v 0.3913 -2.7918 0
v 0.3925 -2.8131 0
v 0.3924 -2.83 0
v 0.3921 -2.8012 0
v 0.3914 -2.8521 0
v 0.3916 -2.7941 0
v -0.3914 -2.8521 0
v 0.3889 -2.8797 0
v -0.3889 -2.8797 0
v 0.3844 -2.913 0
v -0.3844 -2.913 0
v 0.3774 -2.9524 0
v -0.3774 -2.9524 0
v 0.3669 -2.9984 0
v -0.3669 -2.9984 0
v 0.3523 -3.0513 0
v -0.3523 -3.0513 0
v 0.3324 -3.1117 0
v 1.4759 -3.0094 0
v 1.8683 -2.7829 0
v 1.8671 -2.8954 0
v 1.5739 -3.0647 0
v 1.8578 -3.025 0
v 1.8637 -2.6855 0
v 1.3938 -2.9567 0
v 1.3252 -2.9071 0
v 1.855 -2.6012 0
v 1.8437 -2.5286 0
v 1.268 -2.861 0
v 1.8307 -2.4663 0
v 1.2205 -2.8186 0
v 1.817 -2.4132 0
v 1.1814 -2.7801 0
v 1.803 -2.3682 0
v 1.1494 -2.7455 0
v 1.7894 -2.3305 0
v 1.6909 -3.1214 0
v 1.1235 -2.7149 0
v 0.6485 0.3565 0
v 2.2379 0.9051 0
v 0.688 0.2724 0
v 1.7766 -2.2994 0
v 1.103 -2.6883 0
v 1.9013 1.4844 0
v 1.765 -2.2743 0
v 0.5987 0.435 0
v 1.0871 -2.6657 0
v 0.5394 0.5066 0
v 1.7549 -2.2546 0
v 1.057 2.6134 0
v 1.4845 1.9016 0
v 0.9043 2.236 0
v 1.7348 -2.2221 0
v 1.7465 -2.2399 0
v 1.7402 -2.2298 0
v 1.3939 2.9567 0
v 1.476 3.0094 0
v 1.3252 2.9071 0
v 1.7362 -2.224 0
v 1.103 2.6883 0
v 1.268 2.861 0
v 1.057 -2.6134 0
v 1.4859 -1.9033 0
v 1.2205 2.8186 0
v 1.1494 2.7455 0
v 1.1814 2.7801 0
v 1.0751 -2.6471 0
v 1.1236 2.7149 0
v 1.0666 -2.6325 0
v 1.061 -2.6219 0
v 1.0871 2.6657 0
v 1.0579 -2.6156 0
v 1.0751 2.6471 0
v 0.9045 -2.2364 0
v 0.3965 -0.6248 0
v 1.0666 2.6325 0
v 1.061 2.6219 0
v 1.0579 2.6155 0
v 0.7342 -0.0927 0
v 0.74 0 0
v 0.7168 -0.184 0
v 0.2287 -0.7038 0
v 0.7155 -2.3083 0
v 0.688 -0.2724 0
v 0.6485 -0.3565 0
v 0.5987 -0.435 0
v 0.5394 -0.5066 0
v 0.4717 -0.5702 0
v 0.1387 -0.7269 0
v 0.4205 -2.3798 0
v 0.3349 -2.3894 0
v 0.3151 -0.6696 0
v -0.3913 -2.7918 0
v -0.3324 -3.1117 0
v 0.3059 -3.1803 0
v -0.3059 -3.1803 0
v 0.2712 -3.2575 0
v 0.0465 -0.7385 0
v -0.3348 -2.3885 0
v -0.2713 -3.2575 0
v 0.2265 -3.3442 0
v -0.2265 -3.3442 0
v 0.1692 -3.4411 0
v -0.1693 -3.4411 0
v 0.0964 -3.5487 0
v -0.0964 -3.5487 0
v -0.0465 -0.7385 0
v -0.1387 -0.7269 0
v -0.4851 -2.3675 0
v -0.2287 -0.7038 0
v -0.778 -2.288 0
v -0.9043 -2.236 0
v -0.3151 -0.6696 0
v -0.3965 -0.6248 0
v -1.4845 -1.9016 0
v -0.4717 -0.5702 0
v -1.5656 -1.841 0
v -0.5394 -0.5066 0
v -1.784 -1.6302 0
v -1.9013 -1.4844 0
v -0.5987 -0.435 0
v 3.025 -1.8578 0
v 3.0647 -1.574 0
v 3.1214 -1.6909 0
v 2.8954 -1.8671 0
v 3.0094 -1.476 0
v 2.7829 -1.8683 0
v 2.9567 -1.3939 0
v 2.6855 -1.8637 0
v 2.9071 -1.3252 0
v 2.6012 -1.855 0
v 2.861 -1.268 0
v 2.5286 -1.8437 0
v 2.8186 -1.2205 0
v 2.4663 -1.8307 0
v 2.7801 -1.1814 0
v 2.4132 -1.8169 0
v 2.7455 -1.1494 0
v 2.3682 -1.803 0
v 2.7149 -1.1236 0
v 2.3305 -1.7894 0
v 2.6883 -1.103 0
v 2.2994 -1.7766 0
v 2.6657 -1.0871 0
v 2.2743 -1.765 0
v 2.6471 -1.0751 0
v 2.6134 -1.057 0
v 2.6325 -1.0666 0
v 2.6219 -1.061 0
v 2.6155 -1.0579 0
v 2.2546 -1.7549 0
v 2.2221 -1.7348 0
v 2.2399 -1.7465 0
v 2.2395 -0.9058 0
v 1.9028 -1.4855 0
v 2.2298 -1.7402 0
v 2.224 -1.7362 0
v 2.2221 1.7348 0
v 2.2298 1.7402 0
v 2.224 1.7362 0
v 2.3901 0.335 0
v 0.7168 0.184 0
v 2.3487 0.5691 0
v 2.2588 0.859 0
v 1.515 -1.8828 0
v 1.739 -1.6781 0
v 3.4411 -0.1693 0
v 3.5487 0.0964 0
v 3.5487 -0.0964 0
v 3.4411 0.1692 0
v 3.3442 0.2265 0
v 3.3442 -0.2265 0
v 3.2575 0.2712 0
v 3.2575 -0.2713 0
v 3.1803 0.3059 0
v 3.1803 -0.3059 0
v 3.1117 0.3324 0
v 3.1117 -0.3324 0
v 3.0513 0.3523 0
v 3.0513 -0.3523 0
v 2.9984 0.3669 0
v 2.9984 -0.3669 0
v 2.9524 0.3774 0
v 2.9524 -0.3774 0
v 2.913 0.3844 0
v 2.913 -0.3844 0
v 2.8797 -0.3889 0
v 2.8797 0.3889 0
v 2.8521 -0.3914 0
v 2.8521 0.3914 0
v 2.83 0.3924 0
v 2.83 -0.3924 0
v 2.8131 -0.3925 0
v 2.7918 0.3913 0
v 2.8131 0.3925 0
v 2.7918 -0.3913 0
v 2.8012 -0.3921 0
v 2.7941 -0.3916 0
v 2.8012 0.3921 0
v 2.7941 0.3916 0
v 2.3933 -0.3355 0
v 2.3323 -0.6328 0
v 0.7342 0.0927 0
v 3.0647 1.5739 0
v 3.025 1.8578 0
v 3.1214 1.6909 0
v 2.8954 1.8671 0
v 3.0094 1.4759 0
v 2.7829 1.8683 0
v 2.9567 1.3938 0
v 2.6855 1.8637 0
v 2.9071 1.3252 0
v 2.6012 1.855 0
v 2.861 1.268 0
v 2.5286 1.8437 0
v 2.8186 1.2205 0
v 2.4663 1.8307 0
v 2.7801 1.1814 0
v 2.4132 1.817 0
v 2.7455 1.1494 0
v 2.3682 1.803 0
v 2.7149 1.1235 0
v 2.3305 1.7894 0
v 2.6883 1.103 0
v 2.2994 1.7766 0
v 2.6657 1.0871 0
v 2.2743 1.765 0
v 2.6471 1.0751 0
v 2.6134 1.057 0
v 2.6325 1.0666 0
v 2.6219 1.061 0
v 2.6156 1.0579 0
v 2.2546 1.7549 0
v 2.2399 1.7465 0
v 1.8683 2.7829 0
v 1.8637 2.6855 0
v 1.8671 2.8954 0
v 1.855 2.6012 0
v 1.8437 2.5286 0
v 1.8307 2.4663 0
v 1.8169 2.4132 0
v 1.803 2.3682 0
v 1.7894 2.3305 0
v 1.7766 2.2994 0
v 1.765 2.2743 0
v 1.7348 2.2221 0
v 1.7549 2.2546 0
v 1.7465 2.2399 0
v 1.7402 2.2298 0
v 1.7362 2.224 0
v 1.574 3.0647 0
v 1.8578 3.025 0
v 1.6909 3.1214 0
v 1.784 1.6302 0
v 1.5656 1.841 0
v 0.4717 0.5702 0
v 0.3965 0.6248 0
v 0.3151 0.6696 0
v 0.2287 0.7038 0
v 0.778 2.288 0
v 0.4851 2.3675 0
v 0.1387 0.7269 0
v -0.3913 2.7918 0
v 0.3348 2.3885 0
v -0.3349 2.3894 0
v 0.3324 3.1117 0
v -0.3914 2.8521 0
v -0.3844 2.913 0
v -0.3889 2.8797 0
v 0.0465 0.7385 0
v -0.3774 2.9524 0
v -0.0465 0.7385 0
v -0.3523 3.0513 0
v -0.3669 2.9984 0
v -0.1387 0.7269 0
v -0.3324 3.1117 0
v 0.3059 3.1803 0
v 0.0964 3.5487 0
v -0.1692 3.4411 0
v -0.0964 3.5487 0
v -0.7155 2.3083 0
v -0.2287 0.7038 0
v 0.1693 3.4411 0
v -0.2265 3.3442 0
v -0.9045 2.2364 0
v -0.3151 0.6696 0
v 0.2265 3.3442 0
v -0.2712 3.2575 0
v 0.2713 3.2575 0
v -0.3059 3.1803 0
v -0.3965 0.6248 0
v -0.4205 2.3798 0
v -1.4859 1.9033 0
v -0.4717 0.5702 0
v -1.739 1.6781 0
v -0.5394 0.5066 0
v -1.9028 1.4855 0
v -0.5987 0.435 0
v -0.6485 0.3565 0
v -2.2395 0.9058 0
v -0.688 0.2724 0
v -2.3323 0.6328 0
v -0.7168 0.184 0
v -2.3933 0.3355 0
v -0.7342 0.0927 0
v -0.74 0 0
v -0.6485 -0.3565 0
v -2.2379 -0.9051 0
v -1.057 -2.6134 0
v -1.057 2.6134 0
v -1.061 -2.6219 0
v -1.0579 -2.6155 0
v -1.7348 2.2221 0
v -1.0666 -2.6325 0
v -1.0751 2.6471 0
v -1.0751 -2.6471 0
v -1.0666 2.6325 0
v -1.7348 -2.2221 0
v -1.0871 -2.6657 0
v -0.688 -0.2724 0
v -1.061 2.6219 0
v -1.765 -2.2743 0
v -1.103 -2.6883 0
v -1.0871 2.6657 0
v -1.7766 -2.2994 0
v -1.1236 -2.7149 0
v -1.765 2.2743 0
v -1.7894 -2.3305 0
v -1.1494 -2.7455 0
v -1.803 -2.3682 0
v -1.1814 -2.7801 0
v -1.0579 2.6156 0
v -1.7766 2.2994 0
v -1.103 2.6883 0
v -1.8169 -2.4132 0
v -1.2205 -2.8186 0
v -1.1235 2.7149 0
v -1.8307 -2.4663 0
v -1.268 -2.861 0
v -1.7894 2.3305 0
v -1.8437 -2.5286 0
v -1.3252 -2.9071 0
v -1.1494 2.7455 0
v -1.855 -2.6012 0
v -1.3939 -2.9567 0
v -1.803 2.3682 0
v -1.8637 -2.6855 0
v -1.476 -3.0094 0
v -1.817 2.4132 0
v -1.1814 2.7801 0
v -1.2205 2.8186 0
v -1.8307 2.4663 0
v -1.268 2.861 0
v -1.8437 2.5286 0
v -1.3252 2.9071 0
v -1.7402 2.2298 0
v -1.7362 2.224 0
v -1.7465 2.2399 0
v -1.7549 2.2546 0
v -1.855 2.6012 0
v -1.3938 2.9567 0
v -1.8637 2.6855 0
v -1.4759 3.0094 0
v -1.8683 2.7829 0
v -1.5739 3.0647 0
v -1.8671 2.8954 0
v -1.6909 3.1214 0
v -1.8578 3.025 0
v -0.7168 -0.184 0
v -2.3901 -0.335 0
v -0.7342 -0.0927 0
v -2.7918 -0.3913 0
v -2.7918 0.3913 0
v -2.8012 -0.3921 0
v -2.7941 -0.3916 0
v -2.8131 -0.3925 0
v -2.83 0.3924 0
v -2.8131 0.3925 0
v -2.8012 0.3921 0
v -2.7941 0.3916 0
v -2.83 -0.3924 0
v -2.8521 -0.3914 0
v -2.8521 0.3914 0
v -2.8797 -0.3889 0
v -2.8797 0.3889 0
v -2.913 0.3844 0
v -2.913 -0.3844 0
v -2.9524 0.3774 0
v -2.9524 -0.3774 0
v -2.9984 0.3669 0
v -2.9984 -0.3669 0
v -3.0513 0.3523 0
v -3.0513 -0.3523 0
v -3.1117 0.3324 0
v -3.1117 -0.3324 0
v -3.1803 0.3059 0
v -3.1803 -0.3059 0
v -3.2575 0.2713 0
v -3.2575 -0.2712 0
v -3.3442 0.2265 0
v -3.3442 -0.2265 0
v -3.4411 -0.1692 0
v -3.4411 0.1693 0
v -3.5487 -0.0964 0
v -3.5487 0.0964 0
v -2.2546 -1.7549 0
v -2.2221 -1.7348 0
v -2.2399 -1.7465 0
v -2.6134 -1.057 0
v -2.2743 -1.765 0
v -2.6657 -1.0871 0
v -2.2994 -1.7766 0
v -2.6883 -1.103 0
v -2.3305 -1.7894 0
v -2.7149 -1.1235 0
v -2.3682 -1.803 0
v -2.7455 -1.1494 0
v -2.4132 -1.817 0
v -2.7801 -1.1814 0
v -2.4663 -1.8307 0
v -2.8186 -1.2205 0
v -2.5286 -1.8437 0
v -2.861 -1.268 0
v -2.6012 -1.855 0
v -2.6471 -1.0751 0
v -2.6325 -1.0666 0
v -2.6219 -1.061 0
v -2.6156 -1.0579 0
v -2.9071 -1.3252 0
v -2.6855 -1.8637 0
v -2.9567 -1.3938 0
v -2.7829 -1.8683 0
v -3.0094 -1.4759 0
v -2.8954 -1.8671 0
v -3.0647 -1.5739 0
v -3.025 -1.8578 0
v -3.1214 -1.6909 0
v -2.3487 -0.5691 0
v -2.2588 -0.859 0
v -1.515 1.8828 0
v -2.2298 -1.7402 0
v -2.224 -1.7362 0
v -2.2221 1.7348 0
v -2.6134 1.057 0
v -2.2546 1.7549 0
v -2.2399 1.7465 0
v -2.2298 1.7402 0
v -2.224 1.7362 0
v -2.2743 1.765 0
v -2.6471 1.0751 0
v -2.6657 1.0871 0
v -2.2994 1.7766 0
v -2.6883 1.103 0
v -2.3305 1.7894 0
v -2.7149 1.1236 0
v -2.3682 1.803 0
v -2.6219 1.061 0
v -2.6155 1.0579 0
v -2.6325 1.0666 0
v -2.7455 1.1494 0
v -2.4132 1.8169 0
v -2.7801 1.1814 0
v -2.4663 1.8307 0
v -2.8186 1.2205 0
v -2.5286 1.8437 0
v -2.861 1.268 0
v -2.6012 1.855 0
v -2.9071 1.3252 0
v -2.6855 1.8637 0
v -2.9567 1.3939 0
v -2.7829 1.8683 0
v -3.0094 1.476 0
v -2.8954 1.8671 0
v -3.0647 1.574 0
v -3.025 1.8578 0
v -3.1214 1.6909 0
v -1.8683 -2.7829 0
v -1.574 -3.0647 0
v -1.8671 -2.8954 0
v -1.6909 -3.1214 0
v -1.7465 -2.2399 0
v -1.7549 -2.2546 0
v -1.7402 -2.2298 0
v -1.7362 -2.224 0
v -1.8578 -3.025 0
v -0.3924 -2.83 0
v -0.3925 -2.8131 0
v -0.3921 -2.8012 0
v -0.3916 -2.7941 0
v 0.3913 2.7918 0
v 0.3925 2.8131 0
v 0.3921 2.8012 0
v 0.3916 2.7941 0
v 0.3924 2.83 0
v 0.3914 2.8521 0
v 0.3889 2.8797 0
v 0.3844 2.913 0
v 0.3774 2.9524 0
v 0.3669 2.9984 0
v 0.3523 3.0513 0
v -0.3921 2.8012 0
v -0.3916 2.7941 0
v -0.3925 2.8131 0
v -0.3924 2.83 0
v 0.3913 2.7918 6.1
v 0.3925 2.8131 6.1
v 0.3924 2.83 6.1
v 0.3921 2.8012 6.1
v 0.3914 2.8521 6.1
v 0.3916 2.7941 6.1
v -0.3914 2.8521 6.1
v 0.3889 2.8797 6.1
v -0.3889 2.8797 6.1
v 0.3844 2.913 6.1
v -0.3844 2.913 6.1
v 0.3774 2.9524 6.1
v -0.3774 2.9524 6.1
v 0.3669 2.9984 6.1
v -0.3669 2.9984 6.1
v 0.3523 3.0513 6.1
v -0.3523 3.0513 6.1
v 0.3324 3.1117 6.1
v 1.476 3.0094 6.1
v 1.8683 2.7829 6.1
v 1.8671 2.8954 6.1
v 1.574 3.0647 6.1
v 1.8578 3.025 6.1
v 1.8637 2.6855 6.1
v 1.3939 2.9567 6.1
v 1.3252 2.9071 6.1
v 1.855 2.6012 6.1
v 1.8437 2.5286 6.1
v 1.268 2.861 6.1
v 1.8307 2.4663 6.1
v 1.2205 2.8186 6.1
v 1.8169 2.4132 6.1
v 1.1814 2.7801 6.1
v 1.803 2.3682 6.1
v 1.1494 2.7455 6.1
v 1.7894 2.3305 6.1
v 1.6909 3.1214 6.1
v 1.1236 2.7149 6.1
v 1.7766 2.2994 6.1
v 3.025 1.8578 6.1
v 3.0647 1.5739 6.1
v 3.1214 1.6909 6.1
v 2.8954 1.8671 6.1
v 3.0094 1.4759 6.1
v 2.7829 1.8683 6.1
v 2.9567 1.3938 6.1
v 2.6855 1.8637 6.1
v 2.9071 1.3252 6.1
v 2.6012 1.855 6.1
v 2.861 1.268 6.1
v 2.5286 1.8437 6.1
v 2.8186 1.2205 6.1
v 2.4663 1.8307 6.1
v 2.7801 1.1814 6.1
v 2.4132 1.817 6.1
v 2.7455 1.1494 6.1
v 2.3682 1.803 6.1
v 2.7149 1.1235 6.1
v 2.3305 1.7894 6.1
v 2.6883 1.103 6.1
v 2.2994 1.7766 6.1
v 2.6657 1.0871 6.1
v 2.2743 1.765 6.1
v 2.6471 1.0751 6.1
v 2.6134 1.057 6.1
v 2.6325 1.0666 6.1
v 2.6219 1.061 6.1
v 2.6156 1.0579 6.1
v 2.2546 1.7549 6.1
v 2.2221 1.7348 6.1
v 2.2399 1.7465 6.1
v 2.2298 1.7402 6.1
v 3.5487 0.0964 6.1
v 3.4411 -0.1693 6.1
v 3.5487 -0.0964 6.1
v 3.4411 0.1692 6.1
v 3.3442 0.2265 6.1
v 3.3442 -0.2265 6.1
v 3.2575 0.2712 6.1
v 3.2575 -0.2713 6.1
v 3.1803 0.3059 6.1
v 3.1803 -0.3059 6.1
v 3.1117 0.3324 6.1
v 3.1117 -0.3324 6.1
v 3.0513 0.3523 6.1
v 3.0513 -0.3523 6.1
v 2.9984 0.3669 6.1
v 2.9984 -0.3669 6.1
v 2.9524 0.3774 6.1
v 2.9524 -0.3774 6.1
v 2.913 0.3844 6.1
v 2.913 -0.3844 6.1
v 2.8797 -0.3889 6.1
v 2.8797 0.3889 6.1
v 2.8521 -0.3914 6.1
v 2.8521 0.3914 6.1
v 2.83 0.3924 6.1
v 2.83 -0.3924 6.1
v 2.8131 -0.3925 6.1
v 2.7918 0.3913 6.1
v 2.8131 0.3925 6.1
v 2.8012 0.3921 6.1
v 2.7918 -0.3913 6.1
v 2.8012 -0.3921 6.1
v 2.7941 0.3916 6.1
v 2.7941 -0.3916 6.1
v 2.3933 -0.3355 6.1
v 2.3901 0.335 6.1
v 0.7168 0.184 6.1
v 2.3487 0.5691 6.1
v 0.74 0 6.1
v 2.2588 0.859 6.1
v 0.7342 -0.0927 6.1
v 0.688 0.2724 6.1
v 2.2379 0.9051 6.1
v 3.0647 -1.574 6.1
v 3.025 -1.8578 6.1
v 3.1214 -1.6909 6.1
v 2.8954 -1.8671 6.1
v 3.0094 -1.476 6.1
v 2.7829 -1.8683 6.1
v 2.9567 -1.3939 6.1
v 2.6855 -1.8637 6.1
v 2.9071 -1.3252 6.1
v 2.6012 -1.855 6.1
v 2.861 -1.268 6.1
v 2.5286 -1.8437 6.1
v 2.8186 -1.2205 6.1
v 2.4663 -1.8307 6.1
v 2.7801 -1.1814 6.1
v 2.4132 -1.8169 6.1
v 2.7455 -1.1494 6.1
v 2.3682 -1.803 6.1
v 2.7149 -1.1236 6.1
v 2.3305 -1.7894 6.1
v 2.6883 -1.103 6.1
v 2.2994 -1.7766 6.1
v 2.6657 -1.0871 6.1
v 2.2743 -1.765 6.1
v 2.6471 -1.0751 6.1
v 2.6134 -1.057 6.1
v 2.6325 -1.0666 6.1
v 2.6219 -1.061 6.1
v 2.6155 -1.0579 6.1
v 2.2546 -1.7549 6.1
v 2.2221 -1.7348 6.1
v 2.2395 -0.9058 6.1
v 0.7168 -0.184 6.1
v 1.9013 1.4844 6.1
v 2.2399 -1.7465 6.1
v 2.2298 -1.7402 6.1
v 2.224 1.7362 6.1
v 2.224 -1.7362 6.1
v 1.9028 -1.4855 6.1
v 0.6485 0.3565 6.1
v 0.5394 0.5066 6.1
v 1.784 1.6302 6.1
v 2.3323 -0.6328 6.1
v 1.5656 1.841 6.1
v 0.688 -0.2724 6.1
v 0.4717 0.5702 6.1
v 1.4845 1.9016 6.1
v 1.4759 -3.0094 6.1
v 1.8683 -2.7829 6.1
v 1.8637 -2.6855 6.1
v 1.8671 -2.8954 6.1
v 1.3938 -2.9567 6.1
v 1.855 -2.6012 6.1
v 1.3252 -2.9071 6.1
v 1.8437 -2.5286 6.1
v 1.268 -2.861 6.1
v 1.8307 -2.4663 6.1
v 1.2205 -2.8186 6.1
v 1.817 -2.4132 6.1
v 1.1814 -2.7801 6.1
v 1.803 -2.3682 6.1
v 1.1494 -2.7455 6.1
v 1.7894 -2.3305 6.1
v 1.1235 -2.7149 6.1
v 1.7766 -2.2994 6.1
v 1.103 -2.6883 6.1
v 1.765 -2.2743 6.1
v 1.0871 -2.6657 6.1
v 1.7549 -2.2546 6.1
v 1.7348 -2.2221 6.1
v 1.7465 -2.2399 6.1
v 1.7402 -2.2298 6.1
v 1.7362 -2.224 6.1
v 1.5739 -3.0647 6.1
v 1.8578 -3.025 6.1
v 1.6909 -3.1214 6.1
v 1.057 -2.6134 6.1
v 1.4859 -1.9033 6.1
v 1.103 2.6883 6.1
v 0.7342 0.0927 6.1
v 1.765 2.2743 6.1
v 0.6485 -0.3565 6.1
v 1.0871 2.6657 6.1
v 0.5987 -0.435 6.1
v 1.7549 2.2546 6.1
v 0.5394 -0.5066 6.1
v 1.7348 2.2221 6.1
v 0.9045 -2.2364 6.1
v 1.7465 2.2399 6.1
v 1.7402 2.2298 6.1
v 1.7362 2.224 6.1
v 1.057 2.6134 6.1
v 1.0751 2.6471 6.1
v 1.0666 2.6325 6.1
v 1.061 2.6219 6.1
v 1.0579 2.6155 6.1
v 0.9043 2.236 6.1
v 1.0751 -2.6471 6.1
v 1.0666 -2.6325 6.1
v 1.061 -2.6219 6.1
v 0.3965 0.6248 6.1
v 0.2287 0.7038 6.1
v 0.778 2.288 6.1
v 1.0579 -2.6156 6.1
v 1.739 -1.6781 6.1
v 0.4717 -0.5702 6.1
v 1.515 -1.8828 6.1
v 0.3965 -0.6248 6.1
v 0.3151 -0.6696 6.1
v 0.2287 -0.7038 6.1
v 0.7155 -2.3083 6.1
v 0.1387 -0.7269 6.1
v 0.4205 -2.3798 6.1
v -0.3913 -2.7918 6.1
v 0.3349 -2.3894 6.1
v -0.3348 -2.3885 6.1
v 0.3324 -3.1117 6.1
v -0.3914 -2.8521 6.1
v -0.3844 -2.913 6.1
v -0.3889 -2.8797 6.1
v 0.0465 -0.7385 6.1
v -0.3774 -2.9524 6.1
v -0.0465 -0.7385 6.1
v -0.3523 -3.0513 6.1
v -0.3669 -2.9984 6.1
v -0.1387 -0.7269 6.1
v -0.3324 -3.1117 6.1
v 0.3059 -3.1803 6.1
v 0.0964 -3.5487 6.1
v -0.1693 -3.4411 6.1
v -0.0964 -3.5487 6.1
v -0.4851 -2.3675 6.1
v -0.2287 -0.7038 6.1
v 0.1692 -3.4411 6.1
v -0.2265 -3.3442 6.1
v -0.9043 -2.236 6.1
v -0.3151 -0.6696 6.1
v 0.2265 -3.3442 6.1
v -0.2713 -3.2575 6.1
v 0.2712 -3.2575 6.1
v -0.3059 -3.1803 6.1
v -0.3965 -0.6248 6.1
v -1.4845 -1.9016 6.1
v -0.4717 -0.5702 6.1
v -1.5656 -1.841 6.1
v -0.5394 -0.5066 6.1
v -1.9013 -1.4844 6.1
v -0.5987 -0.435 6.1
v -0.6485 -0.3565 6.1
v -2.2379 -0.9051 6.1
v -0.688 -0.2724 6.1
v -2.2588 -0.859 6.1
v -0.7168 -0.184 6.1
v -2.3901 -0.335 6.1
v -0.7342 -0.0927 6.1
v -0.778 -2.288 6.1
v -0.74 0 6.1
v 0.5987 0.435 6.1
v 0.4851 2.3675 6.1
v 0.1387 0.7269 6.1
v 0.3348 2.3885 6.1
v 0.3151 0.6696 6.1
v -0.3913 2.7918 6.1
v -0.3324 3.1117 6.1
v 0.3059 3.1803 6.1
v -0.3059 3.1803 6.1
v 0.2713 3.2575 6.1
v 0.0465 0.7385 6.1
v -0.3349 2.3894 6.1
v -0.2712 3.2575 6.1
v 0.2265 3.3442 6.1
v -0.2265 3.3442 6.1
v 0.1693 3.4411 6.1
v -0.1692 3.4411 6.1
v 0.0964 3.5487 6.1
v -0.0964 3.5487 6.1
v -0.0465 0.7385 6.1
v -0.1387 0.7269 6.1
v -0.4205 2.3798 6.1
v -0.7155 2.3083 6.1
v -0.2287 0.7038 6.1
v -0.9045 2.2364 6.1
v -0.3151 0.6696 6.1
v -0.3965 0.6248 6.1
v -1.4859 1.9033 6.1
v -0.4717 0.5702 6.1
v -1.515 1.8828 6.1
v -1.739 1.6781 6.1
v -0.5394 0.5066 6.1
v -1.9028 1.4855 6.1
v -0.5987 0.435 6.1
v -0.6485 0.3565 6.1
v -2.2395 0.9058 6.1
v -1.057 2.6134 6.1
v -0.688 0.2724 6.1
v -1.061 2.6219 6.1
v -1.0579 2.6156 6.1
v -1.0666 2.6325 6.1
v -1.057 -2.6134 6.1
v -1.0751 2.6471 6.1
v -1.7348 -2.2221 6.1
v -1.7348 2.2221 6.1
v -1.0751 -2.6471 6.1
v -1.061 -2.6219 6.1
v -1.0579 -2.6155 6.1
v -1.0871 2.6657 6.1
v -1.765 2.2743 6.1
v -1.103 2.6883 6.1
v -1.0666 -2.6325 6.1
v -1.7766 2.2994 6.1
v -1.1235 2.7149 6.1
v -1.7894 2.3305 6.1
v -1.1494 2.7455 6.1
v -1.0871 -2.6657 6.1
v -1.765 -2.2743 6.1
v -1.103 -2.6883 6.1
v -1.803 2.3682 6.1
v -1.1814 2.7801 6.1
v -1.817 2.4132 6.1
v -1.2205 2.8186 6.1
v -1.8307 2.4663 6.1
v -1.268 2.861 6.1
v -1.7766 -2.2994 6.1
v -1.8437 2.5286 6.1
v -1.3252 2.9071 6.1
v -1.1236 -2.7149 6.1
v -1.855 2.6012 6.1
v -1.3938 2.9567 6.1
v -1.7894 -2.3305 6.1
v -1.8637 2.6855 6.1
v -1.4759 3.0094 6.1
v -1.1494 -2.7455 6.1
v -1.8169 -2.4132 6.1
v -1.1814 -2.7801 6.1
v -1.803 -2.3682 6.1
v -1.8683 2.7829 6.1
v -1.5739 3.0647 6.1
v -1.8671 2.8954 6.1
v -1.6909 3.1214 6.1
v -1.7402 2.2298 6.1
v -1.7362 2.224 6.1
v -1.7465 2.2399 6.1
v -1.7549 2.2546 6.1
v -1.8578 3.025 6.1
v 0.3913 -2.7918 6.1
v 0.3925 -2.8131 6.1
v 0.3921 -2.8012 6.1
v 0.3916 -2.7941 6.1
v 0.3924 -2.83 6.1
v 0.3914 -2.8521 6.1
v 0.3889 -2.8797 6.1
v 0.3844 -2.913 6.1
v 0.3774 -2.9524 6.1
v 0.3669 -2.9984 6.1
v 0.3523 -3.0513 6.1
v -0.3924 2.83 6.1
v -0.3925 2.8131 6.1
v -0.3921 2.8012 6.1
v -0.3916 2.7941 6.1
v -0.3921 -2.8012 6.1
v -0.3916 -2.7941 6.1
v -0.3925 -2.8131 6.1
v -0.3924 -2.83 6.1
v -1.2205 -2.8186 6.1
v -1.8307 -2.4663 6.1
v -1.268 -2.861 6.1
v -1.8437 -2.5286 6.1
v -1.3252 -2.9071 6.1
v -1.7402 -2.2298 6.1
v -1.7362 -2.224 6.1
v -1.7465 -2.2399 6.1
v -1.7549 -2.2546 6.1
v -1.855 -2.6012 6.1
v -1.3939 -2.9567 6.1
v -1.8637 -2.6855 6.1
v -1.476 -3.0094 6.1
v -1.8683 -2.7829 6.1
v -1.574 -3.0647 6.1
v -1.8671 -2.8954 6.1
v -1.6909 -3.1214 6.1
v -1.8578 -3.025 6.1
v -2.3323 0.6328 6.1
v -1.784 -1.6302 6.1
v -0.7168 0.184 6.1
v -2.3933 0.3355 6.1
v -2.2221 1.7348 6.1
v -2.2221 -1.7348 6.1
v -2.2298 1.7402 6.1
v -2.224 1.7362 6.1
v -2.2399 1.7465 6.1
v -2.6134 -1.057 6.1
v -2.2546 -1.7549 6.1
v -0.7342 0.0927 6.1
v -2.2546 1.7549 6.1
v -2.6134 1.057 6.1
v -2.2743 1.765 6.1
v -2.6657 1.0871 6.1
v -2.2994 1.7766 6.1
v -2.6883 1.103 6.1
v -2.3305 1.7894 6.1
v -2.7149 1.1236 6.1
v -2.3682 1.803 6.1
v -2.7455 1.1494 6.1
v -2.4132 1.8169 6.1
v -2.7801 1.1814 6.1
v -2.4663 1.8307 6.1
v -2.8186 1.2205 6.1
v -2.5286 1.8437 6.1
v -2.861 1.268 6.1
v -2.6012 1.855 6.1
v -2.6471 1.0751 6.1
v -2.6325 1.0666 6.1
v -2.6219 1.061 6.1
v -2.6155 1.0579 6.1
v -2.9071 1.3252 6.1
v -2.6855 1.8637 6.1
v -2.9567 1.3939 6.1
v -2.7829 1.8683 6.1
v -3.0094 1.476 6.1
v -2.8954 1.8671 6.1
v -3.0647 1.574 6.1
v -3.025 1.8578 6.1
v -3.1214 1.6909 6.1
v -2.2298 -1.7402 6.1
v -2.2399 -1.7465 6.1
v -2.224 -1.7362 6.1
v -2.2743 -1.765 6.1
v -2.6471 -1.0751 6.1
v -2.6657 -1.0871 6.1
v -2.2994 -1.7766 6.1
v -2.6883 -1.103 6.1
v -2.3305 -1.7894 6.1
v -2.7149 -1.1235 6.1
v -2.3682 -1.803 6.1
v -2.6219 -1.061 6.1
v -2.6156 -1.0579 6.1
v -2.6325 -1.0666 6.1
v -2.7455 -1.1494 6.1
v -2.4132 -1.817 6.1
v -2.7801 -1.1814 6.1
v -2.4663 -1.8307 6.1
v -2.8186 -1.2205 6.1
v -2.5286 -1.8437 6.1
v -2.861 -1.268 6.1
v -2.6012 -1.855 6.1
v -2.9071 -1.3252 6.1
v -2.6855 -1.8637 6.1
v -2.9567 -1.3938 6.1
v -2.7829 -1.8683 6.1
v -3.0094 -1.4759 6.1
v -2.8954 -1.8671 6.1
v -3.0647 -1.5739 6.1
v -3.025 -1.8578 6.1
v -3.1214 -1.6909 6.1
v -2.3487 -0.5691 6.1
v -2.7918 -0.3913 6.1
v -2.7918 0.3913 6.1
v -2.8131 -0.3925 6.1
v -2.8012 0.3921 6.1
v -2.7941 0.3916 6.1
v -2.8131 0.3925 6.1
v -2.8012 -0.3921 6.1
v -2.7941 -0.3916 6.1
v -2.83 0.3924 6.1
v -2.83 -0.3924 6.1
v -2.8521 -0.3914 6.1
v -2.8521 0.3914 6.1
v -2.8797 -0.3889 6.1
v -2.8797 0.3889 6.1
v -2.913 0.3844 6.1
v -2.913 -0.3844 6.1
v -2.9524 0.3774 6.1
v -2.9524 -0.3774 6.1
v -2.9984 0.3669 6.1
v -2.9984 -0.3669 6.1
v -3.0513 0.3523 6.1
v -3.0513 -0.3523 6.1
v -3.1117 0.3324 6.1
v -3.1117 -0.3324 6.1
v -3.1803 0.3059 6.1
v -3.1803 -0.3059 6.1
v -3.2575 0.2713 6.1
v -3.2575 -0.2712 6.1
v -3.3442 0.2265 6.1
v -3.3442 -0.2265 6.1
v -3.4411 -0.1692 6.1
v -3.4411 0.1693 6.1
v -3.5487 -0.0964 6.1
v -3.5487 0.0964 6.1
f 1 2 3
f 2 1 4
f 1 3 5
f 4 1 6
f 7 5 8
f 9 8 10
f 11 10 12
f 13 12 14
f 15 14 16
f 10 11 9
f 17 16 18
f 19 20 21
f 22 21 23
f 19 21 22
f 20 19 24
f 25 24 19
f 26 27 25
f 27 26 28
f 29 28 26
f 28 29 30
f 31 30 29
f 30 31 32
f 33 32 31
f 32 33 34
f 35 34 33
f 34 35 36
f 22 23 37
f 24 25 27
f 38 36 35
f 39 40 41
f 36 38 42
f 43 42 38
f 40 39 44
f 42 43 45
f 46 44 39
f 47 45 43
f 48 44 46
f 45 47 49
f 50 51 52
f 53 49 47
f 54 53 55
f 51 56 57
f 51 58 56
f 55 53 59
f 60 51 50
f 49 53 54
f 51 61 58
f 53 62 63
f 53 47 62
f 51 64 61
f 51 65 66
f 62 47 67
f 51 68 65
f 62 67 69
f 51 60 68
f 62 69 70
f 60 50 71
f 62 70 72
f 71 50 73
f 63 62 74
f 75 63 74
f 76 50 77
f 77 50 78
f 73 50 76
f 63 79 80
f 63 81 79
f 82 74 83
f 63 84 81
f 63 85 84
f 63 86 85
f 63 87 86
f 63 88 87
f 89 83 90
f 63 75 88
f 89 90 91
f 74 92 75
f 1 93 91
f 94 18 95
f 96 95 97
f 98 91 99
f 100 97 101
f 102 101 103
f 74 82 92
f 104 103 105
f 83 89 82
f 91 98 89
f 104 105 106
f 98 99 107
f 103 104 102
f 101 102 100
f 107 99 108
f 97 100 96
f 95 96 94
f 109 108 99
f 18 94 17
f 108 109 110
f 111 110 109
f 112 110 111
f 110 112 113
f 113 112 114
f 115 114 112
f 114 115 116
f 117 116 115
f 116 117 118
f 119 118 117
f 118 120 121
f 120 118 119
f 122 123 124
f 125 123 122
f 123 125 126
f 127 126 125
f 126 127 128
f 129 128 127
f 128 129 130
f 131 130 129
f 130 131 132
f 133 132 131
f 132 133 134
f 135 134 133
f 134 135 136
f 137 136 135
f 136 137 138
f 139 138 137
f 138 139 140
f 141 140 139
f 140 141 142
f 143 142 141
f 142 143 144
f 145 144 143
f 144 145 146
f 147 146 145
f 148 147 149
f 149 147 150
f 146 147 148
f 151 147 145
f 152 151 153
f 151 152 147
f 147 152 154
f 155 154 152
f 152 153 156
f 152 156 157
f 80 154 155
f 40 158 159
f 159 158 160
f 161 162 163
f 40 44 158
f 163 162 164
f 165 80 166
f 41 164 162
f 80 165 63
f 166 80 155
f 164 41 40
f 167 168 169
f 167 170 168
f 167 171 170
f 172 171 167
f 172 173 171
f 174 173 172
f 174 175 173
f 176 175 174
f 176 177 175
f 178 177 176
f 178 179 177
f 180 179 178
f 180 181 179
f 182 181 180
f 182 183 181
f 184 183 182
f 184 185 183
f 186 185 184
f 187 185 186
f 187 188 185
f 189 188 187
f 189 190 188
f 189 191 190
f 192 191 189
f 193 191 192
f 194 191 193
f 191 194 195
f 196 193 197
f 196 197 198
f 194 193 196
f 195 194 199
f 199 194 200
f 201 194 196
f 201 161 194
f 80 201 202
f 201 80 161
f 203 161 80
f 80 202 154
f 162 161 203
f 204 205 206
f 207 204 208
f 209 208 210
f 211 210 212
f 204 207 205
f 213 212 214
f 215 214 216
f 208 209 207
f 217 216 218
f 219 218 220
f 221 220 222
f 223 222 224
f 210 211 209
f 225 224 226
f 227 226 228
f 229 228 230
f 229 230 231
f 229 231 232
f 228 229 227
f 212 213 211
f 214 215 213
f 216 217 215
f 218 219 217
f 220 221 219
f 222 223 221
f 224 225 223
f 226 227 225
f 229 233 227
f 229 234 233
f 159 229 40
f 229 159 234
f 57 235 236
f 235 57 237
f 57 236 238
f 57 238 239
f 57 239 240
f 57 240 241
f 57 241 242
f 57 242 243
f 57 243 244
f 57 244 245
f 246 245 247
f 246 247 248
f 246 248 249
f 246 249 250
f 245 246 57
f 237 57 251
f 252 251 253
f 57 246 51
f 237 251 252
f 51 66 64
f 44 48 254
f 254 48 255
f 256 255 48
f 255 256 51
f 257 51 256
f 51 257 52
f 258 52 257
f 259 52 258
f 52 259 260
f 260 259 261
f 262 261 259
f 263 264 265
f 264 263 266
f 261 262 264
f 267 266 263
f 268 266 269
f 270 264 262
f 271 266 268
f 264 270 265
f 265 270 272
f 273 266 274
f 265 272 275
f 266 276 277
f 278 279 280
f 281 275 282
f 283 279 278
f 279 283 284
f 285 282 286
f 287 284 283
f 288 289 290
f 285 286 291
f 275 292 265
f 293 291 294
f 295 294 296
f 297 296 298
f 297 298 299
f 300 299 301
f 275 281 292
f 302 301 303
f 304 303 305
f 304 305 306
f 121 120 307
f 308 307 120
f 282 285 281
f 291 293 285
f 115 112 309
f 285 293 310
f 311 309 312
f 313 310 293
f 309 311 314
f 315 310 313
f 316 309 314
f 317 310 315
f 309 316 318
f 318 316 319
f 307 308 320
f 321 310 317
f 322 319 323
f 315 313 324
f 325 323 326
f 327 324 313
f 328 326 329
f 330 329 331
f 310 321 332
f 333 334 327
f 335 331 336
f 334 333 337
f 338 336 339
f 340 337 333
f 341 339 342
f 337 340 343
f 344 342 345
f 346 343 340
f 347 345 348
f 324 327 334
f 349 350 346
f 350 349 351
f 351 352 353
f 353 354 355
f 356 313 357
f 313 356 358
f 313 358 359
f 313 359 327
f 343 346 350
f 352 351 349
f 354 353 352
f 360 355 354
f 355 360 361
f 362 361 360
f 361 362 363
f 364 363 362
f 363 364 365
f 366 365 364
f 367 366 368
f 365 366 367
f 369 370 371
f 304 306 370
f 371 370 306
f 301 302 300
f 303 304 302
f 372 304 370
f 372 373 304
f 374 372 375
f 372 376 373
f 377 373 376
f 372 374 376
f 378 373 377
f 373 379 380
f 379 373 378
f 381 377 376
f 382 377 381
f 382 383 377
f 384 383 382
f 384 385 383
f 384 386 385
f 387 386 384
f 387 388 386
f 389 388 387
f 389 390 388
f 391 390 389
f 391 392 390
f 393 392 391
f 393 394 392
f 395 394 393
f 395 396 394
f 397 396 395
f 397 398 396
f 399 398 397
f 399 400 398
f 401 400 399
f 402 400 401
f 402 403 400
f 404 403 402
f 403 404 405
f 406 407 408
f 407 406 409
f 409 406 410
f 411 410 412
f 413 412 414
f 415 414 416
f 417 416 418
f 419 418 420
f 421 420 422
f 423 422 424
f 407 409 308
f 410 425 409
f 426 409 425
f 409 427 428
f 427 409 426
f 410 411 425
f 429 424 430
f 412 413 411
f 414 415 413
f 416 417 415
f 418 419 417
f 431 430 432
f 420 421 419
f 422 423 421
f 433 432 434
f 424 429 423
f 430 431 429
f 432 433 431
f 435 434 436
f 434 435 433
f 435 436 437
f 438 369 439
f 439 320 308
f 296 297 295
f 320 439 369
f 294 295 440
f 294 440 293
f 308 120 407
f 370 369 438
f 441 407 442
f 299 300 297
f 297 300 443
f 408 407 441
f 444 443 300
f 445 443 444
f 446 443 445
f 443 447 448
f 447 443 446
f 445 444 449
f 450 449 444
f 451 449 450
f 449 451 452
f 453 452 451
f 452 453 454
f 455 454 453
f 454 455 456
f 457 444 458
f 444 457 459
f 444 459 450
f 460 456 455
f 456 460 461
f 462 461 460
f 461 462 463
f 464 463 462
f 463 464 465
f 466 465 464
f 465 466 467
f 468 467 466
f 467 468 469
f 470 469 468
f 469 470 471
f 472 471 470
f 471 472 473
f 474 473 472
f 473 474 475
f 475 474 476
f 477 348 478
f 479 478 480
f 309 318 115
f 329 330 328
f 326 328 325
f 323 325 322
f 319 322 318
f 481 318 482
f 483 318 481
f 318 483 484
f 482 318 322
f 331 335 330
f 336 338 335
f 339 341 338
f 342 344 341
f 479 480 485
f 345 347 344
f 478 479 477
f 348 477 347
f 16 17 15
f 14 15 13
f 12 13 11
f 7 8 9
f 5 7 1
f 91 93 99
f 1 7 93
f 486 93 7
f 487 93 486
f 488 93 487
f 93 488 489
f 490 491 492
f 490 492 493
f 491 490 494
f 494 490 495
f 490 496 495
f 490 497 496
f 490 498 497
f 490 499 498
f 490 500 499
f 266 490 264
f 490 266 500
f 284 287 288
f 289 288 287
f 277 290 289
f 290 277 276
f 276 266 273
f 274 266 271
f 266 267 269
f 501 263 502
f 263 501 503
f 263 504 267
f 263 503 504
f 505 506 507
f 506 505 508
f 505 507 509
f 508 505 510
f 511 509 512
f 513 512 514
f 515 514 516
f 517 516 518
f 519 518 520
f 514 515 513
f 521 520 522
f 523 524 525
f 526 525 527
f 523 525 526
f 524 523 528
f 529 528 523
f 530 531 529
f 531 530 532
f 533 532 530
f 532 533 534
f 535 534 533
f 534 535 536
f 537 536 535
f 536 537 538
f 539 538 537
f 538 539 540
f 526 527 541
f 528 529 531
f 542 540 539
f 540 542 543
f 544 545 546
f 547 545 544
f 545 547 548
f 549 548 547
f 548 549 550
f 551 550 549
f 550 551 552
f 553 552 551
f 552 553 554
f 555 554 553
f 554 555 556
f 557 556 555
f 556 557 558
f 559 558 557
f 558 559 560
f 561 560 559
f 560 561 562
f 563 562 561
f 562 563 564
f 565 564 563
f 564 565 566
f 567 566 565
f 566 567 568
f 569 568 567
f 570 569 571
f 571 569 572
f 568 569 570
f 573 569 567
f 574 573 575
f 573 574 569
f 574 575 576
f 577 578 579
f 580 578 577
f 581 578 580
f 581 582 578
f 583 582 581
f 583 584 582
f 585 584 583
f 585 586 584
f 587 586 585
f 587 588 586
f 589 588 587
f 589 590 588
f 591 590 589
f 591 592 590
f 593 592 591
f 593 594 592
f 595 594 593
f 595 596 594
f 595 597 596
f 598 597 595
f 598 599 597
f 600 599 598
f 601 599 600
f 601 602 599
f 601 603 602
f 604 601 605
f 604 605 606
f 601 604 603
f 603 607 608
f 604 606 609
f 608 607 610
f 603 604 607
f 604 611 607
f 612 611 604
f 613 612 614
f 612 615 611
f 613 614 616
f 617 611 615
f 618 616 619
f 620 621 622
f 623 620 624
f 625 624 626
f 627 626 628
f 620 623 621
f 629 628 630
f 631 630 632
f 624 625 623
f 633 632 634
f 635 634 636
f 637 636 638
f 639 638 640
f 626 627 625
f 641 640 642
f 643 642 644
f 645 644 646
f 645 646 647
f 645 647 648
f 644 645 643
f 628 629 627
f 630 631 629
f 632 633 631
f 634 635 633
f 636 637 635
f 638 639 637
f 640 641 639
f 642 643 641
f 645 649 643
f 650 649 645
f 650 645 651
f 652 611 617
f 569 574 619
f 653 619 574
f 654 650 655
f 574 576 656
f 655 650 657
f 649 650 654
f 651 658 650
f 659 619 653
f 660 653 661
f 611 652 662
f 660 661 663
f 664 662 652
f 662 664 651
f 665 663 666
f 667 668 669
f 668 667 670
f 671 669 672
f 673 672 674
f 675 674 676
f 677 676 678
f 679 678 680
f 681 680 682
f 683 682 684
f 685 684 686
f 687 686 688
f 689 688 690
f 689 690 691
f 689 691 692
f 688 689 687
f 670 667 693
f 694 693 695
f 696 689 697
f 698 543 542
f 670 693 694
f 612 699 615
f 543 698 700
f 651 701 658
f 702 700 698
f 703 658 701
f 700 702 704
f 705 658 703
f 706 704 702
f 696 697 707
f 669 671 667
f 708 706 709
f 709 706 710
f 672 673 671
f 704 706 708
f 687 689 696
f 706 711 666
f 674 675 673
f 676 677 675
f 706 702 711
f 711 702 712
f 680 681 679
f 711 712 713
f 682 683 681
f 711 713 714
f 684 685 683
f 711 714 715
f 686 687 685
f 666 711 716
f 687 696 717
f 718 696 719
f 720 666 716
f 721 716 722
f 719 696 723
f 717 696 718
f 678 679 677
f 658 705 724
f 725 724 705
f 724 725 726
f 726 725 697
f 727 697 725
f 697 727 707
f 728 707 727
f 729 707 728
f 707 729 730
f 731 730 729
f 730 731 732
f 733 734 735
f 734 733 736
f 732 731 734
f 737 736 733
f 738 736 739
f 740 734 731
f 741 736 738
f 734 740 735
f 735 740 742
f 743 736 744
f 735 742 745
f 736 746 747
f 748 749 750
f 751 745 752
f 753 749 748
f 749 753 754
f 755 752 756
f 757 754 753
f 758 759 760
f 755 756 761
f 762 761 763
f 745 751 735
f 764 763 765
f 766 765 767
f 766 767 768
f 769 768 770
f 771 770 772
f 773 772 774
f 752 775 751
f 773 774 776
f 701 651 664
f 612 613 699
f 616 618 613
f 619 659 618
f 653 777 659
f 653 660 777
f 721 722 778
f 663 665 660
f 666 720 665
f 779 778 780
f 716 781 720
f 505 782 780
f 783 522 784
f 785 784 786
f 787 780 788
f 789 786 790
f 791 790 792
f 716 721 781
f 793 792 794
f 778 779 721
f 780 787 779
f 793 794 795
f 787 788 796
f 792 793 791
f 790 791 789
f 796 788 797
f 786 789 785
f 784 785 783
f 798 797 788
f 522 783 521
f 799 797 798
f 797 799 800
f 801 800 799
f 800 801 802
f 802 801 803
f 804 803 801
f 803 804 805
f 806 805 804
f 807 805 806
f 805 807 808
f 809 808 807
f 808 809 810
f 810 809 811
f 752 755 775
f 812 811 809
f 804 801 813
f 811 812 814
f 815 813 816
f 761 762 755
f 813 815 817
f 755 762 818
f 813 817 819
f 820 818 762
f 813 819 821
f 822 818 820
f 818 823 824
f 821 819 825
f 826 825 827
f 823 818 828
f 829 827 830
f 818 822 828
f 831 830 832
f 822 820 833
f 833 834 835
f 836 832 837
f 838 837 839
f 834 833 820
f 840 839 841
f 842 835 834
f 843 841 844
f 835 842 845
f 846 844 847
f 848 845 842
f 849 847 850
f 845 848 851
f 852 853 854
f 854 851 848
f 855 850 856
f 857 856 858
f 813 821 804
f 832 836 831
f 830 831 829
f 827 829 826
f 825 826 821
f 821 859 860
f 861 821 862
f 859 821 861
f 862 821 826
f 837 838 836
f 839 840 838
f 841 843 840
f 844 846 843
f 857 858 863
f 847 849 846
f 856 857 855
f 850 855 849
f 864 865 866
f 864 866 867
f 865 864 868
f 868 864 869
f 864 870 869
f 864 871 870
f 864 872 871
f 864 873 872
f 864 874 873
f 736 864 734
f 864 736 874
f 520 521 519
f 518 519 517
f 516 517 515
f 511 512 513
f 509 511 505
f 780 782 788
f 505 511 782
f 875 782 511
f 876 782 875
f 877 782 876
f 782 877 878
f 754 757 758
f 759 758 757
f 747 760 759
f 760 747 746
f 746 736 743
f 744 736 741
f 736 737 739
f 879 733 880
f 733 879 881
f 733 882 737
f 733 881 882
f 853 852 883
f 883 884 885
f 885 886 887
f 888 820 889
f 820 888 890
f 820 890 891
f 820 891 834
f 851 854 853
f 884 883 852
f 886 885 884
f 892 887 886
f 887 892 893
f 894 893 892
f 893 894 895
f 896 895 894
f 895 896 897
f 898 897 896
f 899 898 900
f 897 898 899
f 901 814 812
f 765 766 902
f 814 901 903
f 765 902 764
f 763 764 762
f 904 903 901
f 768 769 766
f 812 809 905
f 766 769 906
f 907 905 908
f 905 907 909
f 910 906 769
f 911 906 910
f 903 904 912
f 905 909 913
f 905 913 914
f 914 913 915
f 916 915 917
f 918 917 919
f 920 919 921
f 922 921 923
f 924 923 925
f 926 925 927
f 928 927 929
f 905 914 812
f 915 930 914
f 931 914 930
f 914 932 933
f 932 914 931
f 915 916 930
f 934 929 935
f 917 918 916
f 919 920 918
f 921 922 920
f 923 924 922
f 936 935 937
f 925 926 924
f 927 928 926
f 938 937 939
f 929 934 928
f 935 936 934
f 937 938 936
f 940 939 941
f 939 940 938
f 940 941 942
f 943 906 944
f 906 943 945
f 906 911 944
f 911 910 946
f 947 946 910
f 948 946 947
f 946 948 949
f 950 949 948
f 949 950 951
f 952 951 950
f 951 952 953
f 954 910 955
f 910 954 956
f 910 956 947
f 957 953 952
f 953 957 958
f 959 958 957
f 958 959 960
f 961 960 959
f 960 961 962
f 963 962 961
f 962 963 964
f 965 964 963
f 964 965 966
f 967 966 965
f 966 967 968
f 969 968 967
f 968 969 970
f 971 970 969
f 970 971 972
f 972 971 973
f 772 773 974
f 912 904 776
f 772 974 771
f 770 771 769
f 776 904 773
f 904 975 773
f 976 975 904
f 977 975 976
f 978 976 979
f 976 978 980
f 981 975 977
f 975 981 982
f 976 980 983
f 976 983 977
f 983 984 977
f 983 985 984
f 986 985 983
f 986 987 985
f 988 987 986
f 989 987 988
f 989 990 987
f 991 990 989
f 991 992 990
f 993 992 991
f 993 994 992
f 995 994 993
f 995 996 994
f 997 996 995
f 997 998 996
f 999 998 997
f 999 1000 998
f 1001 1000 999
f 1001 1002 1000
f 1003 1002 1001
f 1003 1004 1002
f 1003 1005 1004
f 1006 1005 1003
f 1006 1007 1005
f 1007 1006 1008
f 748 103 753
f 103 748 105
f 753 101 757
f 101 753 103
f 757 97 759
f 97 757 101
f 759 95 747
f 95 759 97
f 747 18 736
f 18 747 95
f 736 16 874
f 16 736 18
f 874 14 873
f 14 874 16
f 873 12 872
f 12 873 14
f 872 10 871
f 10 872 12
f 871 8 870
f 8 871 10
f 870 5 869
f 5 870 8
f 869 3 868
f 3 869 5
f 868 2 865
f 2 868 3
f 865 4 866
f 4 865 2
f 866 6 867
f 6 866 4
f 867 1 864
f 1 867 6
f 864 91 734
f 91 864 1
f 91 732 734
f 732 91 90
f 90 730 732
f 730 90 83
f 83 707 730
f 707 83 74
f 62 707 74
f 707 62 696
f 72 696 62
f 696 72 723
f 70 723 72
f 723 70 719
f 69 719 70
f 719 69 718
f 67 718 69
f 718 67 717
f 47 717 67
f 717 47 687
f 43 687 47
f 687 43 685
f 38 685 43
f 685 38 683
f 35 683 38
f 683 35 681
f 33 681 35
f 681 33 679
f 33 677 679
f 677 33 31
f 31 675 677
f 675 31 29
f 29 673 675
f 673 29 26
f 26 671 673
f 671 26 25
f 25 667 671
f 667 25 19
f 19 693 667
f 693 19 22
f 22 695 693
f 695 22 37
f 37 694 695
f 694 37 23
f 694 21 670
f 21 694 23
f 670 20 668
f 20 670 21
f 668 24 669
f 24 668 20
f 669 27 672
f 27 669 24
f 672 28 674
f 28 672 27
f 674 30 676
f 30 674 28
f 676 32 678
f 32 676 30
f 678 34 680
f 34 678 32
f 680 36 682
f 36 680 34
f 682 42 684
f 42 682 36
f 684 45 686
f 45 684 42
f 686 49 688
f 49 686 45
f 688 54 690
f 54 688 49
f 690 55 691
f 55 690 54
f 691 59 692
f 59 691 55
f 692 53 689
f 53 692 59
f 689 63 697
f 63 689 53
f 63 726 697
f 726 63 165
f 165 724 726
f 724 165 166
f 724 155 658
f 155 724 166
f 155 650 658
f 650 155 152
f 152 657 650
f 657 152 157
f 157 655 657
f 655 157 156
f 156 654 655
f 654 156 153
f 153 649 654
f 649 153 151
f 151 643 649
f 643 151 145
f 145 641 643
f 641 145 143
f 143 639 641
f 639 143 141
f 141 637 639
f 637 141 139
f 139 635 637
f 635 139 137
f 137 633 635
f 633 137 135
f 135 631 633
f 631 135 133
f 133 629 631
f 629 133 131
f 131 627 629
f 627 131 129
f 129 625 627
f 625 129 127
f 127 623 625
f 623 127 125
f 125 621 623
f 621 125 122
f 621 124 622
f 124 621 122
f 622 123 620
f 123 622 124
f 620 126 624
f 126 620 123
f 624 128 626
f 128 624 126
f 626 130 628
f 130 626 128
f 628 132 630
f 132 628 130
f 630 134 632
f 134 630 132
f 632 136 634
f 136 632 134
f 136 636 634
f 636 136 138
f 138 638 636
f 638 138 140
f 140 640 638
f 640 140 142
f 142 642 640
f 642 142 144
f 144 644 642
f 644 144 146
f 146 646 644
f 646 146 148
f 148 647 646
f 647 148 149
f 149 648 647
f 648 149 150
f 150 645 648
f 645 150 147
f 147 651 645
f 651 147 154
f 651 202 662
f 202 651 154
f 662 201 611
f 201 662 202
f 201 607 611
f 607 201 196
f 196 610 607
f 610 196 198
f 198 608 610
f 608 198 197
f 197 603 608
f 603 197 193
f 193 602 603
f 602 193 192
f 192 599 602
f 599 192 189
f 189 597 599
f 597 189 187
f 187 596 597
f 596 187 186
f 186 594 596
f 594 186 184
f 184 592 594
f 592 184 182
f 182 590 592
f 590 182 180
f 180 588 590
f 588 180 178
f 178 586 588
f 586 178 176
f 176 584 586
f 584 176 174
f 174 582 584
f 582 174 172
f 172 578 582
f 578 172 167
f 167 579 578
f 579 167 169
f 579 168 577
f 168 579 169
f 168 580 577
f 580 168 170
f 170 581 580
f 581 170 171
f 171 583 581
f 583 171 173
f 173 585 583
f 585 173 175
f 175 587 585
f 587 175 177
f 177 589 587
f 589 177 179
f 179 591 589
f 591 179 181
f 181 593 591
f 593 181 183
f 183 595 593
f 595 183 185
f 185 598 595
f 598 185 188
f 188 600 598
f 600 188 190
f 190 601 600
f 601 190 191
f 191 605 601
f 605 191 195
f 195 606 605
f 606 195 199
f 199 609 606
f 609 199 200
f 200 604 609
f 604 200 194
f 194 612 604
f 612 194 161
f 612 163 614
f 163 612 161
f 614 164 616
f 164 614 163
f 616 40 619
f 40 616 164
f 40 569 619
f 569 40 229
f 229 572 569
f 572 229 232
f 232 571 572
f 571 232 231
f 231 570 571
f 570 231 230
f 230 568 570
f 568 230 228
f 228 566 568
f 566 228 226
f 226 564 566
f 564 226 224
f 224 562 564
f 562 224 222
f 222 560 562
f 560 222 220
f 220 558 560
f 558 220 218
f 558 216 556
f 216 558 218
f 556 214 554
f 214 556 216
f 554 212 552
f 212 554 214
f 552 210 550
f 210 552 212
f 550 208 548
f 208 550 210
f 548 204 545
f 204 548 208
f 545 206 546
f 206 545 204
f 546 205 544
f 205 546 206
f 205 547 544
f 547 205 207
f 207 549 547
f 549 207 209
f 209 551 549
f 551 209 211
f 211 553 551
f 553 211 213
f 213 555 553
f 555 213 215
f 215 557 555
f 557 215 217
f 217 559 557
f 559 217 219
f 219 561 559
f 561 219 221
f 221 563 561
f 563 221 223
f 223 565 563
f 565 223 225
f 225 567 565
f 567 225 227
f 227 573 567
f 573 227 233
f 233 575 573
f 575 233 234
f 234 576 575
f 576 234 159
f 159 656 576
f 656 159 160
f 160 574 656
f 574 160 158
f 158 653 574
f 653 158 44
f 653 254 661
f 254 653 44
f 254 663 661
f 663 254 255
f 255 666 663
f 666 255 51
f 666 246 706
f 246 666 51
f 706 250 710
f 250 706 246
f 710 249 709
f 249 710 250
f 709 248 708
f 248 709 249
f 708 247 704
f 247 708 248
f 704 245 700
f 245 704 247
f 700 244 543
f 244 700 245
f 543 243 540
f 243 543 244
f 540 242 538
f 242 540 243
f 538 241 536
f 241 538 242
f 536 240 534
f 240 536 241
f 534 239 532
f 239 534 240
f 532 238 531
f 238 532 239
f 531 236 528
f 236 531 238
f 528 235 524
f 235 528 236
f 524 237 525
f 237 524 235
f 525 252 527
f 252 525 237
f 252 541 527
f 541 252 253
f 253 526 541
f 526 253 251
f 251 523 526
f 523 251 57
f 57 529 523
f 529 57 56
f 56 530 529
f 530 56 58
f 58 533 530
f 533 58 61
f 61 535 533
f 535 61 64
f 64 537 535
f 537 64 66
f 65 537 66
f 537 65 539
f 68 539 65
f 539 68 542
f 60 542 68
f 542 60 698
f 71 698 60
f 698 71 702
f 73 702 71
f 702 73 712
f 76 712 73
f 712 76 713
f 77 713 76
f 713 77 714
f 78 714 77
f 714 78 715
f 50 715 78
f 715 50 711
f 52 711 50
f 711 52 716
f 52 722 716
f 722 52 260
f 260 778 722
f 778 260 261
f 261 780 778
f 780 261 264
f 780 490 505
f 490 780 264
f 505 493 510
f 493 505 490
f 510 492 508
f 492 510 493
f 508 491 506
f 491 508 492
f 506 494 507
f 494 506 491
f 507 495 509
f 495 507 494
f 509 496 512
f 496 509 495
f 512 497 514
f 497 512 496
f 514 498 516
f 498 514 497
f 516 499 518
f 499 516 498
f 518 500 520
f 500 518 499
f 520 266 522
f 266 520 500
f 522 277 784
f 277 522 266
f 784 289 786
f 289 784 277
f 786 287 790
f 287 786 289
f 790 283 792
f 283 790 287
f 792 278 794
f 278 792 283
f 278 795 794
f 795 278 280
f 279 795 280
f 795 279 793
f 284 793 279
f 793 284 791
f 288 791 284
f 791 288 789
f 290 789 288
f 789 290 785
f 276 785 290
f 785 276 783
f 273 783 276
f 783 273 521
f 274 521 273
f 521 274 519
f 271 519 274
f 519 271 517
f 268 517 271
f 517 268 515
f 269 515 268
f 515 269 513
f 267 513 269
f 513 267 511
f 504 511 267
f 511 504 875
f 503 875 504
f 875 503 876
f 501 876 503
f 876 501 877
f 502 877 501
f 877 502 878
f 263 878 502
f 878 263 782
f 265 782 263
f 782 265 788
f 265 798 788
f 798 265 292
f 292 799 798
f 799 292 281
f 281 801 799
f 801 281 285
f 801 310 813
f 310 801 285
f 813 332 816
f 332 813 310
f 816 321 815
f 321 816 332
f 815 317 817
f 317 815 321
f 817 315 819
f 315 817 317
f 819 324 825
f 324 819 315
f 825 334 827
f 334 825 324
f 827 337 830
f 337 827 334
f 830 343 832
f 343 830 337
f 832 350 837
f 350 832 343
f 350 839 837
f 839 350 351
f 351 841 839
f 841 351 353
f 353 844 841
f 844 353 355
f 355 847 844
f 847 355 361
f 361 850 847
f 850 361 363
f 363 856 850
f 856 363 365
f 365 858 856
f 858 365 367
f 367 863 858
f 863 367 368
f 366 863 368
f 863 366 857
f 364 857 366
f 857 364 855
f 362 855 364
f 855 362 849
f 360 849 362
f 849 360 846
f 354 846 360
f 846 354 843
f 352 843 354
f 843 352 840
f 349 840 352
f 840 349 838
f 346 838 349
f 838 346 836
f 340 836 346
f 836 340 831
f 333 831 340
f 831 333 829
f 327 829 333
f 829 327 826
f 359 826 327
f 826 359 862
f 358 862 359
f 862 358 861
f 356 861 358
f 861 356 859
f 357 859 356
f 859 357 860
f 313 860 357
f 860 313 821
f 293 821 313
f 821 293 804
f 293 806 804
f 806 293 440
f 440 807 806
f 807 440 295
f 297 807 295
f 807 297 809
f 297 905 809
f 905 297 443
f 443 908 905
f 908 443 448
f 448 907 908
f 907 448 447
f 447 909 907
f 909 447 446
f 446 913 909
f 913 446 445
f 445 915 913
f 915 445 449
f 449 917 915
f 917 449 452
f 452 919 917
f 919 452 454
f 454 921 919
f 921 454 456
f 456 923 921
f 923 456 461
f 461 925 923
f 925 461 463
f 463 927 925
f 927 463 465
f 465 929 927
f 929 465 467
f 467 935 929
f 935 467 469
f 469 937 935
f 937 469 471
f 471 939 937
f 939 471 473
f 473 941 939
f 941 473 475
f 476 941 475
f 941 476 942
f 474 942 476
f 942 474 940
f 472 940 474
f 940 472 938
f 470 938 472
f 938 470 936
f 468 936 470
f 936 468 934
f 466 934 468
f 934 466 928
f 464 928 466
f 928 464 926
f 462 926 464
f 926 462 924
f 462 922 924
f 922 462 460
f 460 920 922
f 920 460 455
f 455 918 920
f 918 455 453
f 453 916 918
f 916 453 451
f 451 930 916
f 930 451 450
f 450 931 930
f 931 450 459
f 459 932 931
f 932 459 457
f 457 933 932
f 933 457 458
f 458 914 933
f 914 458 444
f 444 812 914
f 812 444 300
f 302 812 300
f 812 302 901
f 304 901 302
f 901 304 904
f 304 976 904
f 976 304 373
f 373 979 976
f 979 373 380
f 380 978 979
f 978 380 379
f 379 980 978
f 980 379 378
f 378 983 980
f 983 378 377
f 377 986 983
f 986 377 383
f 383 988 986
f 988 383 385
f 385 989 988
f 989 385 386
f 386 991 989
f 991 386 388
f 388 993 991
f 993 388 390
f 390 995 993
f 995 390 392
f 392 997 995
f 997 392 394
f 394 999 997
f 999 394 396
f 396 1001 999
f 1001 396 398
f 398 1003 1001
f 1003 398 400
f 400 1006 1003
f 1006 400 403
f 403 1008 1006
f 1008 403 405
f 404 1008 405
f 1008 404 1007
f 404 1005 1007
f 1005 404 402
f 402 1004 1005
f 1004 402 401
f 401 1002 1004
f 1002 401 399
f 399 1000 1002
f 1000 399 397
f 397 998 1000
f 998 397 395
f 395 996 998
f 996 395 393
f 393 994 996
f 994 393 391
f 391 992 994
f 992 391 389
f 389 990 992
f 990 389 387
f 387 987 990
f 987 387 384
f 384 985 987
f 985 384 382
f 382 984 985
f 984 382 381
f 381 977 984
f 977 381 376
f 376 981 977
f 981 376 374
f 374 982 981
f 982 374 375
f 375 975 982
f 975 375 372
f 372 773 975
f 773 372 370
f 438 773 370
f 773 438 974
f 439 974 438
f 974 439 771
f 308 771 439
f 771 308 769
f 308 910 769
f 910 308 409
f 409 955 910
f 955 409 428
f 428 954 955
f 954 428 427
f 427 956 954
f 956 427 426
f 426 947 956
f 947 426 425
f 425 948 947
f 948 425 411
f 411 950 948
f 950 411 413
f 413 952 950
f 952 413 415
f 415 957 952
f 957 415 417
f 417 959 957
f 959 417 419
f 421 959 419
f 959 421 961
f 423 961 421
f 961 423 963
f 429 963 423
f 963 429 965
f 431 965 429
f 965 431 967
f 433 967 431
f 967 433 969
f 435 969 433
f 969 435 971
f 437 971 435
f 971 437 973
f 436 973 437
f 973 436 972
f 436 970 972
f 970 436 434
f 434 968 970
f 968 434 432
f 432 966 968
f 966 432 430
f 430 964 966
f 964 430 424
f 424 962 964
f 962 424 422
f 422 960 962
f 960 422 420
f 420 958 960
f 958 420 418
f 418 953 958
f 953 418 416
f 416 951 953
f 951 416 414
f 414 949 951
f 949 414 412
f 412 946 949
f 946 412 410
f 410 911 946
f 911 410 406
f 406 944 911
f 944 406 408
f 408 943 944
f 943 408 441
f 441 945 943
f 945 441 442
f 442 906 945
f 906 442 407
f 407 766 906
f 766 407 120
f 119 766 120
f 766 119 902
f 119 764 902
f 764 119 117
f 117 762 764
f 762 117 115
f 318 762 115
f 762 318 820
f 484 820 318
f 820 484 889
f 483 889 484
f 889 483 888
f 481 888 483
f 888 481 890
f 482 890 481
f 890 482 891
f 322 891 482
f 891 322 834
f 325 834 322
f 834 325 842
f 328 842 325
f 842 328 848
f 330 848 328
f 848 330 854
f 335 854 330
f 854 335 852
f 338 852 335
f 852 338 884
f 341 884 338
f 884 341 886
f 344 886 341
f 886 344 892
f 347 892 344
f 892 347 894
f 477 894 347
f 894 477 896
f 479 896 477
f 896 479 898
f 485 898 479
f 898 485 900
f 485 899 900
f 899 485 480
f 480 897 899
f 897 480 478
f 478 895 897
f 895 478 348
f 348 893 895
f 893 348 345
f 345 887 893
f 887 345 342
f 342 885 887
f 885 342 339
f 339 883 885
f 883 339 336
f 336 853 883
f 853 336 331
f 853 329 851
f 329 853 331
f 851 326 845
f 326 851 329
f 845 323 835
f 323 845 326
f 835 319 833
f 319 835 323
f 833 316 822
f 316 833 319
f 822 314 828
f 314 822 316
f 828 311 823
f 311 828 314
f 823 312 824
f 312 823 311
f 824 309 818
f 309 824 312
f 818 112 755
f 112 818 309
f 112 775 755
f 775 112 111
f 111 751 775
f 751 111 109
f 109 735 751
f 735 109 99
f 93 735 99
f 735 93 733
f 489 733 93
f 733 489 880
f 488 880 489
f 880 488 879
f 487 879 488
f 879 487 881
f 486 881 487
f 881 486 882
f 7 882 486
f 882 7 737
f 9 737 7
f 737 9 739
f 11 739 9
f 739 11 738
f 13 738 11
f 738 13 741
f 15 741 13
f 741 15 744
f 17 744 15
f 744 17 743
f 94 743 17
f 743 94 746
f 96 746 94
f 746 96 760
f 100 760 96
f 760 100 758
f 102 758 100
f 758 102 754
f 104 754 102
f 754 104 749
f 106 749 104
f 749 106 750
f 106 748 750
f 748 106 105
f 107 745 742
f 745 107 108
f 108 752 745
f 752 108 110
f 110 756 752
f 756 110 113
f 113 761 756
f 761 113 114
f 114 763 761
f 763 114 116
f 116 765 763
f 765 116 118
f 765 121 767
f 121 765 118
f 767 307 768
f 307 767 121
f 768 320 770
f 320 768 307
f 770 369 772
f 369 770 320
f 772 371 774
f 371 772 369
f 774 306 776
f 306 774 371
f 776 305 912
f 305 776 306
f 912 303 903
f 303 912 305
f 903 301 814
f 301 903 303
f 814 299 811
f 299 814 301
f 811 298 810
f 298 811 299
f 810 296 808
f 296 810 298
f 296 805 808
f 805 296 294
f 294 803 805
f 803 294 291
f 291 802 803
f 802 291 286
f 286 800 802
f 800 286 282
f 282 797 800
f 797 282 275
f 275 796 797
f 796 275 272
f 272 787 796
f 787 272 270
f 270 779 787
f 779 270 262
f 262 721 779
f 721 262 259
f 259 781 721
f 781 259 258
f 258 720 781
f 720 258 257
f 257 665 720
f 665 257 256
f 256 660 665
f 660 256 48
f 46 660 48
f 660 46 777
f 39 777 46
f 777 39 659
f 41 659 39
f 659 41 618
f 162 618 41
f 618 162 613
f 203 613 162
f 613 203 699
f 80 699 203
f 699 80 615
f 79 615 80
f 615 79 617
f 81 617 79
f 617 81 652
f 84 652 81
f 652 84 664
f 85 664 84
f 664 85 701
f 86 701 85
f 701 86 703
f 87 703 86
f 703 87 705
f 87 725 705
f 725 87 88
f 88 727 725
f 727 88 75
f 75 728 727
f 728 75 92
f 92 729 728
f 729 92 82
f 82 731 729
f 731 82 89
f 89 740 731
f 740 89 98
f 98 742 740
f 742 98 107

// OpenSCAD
/* Micromouse Pinion */
use <gears-master/gears.scad>;
$fn = 200;
tolerance=1.1;

module pinion() {
spur_gear (modul=0.5, tooth_number=16, width=5+tolerance, bore=3.05, pressure_angle=20, helix_angle=0, optimized=true);
translate([0,1.5-(0.54/2),2.5+tolerance/2]) cube([3,0.54,5+tolerance], center=true);
}

module pinion_faulhaber() {
spur_gear (modul=0.5, tooth_number=12, width=5+tolerance, bore=1.48, pressure_angle=20, helix_angle=0, optimized=true);
}


pinion_faulhaber();
